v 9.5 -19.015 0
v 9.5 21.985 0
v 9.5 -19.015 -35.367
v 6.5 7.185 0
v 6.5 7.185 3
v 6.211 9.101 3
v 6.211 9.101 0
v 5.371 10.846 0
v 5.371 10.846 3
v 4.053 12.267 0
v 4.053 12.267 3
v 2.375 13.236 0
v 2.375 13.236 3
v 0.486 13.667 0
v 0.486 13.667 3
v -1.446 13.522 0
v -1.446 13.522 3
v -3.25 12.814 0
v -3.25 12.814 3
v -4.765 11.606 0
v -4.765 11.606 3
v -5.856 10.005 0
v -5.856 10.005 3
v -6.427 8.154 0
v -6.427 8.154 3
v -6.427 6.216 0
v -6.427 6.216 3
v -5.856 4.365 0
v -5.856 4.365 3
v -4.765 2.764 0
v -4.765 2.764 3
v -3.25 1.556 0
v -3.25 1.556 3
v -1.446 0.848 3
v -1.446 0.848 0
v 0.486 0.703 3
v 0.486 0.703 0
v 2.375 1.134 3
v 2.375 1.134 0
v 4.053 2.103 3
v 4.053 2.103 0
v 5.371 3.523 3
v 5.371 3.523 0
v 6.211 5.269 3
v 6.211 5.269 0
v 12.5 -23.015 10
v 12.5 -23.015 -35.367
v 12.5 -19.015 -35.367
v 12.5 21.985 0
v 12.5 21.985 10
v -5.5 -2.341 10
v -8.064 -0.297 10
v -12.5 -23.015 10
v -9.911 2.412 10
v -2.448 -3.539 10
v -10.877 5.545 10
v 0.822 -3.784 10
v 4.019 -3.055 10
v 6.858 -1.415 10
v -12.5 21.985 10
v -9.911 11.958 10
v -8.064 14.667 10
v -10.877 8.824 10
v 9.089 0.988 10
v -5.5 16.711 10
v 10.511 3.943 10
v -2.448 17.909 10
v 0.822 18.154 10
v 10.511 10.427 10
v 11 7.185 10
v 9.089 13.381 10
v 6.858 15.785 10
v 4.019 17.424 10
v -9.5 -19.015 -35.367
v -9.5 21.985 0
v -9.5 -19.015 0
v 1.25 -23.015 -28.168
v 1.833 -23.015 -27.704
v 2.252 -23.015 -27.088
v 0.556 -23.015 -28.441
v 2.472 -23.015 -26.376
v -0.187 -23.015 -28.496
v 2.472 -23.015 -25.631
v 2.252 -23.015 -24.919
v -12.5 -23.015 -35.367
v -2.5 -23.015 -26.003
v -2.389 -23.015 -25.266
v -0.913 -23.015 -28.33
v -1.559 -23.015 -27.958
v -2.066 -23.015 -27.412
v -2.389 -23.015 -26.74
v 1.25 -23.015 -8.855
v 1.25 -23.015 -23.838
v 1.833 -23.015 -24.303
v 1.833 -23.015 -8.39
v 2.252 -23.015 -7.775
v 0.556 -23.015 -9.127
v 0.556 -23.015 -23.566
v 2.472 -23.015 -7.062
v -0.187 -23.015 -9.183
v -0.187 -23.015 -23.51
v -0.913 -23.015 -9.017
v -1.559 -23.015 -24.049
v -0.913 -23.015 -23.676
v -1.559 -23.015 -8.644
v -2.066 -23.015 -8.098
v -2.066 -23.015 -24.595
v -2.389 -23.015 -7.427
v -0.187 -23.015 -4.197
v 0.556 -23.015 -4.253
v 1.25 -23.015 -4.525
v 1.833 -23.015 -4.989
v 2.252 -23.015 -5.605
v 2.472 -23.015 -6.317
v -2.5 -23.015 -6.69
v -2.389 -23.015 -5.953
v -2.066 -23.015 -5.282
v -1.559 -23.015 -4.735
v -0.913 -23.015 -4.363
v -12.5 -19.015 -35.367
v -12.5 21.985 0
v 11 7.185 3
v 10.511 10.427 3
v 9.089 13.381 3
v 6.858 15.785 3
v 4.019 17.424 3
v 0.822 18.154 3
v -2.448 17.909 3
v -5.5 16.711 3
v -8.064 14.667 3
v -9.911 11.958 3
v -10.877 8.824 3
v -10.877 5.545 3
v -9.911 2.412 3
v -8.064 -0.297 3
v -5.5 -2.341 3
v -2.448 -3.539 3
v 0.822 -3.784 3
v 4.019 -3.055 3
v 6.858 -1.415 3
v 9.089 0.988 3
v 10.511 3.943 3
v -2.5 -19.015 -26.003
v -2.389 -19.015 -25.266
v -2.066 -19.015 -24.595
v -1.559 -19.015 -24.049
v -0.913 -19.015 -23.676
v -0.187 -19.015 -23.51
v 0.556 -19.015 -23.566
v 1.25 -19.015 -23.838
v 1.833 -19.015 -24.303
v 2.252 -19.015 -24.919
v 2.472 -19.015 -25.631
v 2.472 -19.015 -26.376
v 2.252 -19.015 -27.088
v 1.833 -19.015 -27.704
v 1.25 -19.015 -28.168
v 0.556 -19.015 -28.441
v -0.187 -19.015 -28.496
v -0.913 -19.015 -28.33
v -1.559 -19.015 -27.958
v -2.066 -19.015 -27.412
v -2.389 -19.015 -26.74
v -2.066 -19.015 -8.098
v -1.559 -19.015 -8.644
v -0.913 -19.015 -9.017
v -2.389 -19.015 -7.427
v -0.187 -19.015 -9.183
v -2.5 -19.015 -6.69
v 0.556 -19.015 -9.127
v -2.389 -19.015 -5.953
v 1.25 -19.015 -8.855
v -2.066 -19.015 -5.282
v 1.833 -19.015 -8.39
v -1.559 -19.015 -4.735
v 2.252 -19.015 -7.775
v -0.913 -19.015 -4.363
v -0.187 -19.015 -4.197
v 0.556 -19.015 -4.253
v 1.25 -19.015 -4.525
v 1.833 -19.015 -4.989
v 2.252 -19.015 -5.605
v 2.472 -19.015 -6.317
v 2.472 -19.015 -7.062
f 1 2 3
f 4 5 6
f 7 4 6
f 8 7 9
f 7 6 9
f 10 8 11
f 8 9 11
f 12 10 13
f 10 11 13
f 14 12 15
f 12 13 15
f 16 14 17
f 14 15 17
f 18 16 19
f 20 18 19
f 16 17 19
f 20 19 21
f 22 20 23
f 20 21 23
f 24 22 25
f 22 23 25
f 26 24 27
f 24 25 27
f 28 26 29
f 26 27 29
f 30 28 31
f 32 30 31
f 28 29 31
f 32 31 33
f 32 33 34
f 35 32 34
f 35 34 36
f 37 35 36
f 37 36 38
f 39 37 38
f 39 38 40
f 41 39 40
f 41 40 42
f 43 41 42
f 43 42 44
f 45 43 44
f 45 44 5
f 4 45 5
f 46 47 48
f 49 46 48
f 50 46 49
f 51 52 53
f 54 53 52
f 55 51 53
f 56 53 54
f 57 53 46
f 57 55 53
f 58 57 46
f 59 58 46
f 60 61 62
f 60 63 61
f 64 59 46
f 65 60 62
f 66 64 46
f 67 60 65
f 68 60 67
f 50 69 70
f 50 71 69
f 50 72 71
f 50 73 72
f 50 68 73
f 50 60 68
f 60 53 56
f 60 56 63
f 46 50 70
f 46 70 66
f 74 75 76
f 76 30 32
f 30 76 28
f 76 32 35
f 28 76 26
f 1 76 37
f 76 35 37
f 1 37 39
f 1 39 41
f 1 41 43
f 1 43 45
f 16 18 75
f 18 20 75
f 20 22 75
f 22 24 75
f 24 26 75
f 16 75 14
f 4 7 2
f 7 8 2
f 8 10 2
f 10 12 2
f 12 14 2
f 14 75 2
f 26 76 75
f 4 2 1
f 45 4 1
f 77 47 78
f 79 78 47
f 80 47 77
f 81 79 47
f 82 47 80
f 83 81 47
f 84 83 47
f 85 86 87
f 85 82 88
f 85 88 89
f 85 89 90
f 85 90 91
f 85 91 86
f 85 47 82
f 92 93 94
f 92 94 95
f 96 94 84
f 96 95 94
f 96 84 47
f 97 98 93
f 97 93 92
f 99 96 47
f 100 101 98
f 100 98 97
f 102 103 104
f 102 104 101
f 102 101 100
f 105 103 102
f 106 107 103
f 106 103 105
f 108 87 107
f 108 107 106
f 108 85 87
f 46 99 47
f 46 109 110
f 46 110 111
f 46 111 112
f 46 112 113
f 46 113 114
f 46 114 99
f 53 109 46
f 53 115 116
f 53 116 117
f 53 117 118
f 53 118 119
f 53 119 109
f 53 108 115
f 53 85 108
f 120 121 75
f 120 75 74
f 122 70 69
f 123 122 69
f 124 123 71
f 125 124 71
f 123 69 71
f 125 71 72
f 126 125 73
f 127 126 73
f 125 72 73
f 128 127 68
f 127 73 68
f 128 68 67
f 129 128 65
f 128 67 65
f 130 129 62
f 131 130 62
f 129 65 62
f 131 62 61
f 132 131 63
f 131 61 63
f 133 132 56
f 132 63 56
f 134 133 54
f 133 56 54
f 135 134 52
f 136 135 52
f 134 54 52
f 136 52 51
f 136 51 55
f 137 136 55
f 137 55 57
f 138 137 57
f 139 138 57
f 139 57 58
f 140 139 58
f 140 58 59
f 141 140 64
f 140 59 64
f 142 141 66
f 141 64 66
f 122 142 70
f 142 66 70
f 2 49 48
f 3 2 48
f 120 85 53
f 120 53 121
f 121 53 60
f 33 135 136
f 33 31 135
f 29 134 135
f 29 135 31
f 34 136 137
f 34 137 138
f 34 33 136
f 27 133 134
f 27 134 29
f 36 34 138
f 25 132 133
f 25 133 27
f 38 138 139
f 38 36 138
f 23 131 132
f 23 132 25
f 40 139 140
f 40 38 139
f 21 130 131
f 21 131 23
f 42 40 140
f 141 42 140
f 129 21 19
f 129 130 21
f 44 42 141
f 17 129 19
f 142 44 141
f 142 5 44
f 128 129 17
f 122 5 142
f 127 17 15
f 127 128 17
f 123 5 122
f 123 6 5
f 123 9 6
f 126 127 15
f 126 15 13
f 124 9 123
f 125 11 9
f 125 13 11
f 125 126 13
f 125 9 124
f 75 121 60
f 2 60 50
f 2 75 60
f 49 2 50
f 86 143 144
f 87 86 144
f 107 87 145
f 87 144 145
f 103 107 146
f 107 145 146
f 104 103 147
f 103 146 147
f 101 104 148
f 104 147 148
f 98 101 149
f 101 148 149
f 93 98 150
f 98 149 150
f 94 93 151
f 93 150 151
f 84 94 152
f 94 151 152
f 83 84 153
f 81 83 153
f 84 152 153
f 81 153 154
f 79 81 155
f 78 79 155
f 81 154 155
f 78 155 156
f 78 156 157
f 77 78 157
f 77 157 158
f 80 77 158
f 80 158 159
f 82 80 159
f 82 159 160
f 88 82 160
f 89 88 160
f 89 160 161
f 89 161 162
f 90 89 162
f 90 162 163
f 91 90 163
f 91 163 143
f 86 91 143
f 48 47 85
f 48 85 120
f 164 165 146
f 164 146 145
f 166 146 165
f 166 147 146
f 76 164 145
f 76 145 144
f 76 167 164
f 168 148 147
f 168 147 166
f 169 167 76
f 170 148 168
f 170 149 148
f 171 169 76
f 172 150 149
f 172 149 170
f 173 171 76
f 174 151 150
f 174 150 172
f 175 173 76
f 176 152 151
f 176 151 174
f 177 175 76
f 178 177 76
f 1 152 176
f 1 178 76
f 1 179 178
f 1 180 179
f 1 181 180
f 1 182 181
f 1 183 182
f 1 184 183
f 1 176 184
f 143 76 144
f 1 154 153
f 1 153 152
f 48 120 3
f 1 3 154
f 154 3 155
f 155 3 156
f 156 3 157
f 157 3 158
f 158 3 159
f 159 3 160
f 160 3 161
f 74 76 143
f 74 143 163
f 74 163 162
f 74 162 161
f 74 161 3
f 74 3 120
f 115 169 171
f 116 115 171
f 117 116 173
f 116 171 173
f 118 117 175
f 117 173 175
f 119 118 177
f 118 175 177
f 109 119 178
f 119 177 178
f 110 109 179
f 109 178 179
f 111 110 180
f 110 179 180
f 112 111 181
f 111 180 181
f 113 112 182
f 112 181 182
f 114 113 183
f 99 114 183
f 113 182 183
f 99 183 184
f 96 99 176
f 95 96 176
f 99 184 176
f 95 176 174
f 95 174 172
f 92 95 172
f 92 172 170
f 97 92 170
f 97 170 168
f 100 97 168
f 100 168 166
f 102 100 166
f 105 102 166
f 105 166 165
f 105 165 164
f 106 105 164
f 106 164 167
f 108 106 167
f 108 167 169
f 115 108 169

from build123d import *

# Parameters (mm, degrees)
SKETCH_W        = 25
SKETCH_H        = 45
PAD_DEPTH       = 10
SKETCH001_R     = 11
POCKET_DEPTH    = 7
PAD001_DEPTH    = 3
SKETCH005_W     = 4
SKETCH005_H     = 45.367283
PAD002_DEPTH    = 25
SKETCH003_R     = 6.5
POCKET001_DEPTH = 5
SKETCH007_R     = 2.5
POCKET002_DEPTH = 5


with BuildPart() as part:
    # Sketch → Pad (new body)
    with BuildSketch(Plane.XY):
        with Locations((0, -0.515162)):
            Rectangle(SKETCH_W, SKETCH_H)
    extrude(amount=PAD_DEPTH)

    # Sketch001 (on Face6 of Pad) → Pocket (cut)
    with BuildSketch(Plane.XY.offset(10)):
        with Locations((0, 7.184838)):
            Circle(SKETCH001_R)
    extrude(amount=-POCKET_DEPTH, mode=Mode.SUBTRACT)

    # Sketch004 (on Face3 of Pocket) → Pad001 (join)
    with BuildSketch(Plane.YZ.offset(12.5)):
        Polygon((-23.015162, 0), (21.984838, 0), (-19.015162, -35.367283), (-23.015162, -35.367283), align=None)
    pad001 = extrude(amount=-PAD001_DEPTH)

    # Sketch005 (on Face8 of Pad001) → Pad002 (join)
    with BuildSketch(Plane.YZ.offset(12.5)):
        with Locations((-21.015162, -12.683642)):
            Rectangle(SKETCH005_W, SKETCH005_H)
    extrude(amount=-PAD002_DEPTH)

    # Mirrored: Pad001 across YZ
    add(pad001.mirror(Plane.YZ))

    # Sketch003 (on Face8 of Pocket) → Pocket001 (cut)
    with BuildSketch(Plane.XY.offset(3)):
        with Locations((0, 7.184838)):
            Circle(SKETCH003_R)
    extrude(amount=-POCKET001_DEPTH, mode=Mode.SUBTRACT)

    # Sketch007 (on Face15 of Pocket001) → Pocket002 (cut)
    with BuildSketch(Plane(origin=(0, -19.015162, 0), x_dir=(-1, 0, 0), z_dir=(0, 1, 0))):
        with Locations((0, -6.689823)):
            Circle(SKETCH007_R)
        with Locations((0, -26.003223)):
            Circle(SKETCH007_R)
    extrude(amount=-POCKET002_DEPTH, mode=Mode.SUBTRACT)


solid = part.part
